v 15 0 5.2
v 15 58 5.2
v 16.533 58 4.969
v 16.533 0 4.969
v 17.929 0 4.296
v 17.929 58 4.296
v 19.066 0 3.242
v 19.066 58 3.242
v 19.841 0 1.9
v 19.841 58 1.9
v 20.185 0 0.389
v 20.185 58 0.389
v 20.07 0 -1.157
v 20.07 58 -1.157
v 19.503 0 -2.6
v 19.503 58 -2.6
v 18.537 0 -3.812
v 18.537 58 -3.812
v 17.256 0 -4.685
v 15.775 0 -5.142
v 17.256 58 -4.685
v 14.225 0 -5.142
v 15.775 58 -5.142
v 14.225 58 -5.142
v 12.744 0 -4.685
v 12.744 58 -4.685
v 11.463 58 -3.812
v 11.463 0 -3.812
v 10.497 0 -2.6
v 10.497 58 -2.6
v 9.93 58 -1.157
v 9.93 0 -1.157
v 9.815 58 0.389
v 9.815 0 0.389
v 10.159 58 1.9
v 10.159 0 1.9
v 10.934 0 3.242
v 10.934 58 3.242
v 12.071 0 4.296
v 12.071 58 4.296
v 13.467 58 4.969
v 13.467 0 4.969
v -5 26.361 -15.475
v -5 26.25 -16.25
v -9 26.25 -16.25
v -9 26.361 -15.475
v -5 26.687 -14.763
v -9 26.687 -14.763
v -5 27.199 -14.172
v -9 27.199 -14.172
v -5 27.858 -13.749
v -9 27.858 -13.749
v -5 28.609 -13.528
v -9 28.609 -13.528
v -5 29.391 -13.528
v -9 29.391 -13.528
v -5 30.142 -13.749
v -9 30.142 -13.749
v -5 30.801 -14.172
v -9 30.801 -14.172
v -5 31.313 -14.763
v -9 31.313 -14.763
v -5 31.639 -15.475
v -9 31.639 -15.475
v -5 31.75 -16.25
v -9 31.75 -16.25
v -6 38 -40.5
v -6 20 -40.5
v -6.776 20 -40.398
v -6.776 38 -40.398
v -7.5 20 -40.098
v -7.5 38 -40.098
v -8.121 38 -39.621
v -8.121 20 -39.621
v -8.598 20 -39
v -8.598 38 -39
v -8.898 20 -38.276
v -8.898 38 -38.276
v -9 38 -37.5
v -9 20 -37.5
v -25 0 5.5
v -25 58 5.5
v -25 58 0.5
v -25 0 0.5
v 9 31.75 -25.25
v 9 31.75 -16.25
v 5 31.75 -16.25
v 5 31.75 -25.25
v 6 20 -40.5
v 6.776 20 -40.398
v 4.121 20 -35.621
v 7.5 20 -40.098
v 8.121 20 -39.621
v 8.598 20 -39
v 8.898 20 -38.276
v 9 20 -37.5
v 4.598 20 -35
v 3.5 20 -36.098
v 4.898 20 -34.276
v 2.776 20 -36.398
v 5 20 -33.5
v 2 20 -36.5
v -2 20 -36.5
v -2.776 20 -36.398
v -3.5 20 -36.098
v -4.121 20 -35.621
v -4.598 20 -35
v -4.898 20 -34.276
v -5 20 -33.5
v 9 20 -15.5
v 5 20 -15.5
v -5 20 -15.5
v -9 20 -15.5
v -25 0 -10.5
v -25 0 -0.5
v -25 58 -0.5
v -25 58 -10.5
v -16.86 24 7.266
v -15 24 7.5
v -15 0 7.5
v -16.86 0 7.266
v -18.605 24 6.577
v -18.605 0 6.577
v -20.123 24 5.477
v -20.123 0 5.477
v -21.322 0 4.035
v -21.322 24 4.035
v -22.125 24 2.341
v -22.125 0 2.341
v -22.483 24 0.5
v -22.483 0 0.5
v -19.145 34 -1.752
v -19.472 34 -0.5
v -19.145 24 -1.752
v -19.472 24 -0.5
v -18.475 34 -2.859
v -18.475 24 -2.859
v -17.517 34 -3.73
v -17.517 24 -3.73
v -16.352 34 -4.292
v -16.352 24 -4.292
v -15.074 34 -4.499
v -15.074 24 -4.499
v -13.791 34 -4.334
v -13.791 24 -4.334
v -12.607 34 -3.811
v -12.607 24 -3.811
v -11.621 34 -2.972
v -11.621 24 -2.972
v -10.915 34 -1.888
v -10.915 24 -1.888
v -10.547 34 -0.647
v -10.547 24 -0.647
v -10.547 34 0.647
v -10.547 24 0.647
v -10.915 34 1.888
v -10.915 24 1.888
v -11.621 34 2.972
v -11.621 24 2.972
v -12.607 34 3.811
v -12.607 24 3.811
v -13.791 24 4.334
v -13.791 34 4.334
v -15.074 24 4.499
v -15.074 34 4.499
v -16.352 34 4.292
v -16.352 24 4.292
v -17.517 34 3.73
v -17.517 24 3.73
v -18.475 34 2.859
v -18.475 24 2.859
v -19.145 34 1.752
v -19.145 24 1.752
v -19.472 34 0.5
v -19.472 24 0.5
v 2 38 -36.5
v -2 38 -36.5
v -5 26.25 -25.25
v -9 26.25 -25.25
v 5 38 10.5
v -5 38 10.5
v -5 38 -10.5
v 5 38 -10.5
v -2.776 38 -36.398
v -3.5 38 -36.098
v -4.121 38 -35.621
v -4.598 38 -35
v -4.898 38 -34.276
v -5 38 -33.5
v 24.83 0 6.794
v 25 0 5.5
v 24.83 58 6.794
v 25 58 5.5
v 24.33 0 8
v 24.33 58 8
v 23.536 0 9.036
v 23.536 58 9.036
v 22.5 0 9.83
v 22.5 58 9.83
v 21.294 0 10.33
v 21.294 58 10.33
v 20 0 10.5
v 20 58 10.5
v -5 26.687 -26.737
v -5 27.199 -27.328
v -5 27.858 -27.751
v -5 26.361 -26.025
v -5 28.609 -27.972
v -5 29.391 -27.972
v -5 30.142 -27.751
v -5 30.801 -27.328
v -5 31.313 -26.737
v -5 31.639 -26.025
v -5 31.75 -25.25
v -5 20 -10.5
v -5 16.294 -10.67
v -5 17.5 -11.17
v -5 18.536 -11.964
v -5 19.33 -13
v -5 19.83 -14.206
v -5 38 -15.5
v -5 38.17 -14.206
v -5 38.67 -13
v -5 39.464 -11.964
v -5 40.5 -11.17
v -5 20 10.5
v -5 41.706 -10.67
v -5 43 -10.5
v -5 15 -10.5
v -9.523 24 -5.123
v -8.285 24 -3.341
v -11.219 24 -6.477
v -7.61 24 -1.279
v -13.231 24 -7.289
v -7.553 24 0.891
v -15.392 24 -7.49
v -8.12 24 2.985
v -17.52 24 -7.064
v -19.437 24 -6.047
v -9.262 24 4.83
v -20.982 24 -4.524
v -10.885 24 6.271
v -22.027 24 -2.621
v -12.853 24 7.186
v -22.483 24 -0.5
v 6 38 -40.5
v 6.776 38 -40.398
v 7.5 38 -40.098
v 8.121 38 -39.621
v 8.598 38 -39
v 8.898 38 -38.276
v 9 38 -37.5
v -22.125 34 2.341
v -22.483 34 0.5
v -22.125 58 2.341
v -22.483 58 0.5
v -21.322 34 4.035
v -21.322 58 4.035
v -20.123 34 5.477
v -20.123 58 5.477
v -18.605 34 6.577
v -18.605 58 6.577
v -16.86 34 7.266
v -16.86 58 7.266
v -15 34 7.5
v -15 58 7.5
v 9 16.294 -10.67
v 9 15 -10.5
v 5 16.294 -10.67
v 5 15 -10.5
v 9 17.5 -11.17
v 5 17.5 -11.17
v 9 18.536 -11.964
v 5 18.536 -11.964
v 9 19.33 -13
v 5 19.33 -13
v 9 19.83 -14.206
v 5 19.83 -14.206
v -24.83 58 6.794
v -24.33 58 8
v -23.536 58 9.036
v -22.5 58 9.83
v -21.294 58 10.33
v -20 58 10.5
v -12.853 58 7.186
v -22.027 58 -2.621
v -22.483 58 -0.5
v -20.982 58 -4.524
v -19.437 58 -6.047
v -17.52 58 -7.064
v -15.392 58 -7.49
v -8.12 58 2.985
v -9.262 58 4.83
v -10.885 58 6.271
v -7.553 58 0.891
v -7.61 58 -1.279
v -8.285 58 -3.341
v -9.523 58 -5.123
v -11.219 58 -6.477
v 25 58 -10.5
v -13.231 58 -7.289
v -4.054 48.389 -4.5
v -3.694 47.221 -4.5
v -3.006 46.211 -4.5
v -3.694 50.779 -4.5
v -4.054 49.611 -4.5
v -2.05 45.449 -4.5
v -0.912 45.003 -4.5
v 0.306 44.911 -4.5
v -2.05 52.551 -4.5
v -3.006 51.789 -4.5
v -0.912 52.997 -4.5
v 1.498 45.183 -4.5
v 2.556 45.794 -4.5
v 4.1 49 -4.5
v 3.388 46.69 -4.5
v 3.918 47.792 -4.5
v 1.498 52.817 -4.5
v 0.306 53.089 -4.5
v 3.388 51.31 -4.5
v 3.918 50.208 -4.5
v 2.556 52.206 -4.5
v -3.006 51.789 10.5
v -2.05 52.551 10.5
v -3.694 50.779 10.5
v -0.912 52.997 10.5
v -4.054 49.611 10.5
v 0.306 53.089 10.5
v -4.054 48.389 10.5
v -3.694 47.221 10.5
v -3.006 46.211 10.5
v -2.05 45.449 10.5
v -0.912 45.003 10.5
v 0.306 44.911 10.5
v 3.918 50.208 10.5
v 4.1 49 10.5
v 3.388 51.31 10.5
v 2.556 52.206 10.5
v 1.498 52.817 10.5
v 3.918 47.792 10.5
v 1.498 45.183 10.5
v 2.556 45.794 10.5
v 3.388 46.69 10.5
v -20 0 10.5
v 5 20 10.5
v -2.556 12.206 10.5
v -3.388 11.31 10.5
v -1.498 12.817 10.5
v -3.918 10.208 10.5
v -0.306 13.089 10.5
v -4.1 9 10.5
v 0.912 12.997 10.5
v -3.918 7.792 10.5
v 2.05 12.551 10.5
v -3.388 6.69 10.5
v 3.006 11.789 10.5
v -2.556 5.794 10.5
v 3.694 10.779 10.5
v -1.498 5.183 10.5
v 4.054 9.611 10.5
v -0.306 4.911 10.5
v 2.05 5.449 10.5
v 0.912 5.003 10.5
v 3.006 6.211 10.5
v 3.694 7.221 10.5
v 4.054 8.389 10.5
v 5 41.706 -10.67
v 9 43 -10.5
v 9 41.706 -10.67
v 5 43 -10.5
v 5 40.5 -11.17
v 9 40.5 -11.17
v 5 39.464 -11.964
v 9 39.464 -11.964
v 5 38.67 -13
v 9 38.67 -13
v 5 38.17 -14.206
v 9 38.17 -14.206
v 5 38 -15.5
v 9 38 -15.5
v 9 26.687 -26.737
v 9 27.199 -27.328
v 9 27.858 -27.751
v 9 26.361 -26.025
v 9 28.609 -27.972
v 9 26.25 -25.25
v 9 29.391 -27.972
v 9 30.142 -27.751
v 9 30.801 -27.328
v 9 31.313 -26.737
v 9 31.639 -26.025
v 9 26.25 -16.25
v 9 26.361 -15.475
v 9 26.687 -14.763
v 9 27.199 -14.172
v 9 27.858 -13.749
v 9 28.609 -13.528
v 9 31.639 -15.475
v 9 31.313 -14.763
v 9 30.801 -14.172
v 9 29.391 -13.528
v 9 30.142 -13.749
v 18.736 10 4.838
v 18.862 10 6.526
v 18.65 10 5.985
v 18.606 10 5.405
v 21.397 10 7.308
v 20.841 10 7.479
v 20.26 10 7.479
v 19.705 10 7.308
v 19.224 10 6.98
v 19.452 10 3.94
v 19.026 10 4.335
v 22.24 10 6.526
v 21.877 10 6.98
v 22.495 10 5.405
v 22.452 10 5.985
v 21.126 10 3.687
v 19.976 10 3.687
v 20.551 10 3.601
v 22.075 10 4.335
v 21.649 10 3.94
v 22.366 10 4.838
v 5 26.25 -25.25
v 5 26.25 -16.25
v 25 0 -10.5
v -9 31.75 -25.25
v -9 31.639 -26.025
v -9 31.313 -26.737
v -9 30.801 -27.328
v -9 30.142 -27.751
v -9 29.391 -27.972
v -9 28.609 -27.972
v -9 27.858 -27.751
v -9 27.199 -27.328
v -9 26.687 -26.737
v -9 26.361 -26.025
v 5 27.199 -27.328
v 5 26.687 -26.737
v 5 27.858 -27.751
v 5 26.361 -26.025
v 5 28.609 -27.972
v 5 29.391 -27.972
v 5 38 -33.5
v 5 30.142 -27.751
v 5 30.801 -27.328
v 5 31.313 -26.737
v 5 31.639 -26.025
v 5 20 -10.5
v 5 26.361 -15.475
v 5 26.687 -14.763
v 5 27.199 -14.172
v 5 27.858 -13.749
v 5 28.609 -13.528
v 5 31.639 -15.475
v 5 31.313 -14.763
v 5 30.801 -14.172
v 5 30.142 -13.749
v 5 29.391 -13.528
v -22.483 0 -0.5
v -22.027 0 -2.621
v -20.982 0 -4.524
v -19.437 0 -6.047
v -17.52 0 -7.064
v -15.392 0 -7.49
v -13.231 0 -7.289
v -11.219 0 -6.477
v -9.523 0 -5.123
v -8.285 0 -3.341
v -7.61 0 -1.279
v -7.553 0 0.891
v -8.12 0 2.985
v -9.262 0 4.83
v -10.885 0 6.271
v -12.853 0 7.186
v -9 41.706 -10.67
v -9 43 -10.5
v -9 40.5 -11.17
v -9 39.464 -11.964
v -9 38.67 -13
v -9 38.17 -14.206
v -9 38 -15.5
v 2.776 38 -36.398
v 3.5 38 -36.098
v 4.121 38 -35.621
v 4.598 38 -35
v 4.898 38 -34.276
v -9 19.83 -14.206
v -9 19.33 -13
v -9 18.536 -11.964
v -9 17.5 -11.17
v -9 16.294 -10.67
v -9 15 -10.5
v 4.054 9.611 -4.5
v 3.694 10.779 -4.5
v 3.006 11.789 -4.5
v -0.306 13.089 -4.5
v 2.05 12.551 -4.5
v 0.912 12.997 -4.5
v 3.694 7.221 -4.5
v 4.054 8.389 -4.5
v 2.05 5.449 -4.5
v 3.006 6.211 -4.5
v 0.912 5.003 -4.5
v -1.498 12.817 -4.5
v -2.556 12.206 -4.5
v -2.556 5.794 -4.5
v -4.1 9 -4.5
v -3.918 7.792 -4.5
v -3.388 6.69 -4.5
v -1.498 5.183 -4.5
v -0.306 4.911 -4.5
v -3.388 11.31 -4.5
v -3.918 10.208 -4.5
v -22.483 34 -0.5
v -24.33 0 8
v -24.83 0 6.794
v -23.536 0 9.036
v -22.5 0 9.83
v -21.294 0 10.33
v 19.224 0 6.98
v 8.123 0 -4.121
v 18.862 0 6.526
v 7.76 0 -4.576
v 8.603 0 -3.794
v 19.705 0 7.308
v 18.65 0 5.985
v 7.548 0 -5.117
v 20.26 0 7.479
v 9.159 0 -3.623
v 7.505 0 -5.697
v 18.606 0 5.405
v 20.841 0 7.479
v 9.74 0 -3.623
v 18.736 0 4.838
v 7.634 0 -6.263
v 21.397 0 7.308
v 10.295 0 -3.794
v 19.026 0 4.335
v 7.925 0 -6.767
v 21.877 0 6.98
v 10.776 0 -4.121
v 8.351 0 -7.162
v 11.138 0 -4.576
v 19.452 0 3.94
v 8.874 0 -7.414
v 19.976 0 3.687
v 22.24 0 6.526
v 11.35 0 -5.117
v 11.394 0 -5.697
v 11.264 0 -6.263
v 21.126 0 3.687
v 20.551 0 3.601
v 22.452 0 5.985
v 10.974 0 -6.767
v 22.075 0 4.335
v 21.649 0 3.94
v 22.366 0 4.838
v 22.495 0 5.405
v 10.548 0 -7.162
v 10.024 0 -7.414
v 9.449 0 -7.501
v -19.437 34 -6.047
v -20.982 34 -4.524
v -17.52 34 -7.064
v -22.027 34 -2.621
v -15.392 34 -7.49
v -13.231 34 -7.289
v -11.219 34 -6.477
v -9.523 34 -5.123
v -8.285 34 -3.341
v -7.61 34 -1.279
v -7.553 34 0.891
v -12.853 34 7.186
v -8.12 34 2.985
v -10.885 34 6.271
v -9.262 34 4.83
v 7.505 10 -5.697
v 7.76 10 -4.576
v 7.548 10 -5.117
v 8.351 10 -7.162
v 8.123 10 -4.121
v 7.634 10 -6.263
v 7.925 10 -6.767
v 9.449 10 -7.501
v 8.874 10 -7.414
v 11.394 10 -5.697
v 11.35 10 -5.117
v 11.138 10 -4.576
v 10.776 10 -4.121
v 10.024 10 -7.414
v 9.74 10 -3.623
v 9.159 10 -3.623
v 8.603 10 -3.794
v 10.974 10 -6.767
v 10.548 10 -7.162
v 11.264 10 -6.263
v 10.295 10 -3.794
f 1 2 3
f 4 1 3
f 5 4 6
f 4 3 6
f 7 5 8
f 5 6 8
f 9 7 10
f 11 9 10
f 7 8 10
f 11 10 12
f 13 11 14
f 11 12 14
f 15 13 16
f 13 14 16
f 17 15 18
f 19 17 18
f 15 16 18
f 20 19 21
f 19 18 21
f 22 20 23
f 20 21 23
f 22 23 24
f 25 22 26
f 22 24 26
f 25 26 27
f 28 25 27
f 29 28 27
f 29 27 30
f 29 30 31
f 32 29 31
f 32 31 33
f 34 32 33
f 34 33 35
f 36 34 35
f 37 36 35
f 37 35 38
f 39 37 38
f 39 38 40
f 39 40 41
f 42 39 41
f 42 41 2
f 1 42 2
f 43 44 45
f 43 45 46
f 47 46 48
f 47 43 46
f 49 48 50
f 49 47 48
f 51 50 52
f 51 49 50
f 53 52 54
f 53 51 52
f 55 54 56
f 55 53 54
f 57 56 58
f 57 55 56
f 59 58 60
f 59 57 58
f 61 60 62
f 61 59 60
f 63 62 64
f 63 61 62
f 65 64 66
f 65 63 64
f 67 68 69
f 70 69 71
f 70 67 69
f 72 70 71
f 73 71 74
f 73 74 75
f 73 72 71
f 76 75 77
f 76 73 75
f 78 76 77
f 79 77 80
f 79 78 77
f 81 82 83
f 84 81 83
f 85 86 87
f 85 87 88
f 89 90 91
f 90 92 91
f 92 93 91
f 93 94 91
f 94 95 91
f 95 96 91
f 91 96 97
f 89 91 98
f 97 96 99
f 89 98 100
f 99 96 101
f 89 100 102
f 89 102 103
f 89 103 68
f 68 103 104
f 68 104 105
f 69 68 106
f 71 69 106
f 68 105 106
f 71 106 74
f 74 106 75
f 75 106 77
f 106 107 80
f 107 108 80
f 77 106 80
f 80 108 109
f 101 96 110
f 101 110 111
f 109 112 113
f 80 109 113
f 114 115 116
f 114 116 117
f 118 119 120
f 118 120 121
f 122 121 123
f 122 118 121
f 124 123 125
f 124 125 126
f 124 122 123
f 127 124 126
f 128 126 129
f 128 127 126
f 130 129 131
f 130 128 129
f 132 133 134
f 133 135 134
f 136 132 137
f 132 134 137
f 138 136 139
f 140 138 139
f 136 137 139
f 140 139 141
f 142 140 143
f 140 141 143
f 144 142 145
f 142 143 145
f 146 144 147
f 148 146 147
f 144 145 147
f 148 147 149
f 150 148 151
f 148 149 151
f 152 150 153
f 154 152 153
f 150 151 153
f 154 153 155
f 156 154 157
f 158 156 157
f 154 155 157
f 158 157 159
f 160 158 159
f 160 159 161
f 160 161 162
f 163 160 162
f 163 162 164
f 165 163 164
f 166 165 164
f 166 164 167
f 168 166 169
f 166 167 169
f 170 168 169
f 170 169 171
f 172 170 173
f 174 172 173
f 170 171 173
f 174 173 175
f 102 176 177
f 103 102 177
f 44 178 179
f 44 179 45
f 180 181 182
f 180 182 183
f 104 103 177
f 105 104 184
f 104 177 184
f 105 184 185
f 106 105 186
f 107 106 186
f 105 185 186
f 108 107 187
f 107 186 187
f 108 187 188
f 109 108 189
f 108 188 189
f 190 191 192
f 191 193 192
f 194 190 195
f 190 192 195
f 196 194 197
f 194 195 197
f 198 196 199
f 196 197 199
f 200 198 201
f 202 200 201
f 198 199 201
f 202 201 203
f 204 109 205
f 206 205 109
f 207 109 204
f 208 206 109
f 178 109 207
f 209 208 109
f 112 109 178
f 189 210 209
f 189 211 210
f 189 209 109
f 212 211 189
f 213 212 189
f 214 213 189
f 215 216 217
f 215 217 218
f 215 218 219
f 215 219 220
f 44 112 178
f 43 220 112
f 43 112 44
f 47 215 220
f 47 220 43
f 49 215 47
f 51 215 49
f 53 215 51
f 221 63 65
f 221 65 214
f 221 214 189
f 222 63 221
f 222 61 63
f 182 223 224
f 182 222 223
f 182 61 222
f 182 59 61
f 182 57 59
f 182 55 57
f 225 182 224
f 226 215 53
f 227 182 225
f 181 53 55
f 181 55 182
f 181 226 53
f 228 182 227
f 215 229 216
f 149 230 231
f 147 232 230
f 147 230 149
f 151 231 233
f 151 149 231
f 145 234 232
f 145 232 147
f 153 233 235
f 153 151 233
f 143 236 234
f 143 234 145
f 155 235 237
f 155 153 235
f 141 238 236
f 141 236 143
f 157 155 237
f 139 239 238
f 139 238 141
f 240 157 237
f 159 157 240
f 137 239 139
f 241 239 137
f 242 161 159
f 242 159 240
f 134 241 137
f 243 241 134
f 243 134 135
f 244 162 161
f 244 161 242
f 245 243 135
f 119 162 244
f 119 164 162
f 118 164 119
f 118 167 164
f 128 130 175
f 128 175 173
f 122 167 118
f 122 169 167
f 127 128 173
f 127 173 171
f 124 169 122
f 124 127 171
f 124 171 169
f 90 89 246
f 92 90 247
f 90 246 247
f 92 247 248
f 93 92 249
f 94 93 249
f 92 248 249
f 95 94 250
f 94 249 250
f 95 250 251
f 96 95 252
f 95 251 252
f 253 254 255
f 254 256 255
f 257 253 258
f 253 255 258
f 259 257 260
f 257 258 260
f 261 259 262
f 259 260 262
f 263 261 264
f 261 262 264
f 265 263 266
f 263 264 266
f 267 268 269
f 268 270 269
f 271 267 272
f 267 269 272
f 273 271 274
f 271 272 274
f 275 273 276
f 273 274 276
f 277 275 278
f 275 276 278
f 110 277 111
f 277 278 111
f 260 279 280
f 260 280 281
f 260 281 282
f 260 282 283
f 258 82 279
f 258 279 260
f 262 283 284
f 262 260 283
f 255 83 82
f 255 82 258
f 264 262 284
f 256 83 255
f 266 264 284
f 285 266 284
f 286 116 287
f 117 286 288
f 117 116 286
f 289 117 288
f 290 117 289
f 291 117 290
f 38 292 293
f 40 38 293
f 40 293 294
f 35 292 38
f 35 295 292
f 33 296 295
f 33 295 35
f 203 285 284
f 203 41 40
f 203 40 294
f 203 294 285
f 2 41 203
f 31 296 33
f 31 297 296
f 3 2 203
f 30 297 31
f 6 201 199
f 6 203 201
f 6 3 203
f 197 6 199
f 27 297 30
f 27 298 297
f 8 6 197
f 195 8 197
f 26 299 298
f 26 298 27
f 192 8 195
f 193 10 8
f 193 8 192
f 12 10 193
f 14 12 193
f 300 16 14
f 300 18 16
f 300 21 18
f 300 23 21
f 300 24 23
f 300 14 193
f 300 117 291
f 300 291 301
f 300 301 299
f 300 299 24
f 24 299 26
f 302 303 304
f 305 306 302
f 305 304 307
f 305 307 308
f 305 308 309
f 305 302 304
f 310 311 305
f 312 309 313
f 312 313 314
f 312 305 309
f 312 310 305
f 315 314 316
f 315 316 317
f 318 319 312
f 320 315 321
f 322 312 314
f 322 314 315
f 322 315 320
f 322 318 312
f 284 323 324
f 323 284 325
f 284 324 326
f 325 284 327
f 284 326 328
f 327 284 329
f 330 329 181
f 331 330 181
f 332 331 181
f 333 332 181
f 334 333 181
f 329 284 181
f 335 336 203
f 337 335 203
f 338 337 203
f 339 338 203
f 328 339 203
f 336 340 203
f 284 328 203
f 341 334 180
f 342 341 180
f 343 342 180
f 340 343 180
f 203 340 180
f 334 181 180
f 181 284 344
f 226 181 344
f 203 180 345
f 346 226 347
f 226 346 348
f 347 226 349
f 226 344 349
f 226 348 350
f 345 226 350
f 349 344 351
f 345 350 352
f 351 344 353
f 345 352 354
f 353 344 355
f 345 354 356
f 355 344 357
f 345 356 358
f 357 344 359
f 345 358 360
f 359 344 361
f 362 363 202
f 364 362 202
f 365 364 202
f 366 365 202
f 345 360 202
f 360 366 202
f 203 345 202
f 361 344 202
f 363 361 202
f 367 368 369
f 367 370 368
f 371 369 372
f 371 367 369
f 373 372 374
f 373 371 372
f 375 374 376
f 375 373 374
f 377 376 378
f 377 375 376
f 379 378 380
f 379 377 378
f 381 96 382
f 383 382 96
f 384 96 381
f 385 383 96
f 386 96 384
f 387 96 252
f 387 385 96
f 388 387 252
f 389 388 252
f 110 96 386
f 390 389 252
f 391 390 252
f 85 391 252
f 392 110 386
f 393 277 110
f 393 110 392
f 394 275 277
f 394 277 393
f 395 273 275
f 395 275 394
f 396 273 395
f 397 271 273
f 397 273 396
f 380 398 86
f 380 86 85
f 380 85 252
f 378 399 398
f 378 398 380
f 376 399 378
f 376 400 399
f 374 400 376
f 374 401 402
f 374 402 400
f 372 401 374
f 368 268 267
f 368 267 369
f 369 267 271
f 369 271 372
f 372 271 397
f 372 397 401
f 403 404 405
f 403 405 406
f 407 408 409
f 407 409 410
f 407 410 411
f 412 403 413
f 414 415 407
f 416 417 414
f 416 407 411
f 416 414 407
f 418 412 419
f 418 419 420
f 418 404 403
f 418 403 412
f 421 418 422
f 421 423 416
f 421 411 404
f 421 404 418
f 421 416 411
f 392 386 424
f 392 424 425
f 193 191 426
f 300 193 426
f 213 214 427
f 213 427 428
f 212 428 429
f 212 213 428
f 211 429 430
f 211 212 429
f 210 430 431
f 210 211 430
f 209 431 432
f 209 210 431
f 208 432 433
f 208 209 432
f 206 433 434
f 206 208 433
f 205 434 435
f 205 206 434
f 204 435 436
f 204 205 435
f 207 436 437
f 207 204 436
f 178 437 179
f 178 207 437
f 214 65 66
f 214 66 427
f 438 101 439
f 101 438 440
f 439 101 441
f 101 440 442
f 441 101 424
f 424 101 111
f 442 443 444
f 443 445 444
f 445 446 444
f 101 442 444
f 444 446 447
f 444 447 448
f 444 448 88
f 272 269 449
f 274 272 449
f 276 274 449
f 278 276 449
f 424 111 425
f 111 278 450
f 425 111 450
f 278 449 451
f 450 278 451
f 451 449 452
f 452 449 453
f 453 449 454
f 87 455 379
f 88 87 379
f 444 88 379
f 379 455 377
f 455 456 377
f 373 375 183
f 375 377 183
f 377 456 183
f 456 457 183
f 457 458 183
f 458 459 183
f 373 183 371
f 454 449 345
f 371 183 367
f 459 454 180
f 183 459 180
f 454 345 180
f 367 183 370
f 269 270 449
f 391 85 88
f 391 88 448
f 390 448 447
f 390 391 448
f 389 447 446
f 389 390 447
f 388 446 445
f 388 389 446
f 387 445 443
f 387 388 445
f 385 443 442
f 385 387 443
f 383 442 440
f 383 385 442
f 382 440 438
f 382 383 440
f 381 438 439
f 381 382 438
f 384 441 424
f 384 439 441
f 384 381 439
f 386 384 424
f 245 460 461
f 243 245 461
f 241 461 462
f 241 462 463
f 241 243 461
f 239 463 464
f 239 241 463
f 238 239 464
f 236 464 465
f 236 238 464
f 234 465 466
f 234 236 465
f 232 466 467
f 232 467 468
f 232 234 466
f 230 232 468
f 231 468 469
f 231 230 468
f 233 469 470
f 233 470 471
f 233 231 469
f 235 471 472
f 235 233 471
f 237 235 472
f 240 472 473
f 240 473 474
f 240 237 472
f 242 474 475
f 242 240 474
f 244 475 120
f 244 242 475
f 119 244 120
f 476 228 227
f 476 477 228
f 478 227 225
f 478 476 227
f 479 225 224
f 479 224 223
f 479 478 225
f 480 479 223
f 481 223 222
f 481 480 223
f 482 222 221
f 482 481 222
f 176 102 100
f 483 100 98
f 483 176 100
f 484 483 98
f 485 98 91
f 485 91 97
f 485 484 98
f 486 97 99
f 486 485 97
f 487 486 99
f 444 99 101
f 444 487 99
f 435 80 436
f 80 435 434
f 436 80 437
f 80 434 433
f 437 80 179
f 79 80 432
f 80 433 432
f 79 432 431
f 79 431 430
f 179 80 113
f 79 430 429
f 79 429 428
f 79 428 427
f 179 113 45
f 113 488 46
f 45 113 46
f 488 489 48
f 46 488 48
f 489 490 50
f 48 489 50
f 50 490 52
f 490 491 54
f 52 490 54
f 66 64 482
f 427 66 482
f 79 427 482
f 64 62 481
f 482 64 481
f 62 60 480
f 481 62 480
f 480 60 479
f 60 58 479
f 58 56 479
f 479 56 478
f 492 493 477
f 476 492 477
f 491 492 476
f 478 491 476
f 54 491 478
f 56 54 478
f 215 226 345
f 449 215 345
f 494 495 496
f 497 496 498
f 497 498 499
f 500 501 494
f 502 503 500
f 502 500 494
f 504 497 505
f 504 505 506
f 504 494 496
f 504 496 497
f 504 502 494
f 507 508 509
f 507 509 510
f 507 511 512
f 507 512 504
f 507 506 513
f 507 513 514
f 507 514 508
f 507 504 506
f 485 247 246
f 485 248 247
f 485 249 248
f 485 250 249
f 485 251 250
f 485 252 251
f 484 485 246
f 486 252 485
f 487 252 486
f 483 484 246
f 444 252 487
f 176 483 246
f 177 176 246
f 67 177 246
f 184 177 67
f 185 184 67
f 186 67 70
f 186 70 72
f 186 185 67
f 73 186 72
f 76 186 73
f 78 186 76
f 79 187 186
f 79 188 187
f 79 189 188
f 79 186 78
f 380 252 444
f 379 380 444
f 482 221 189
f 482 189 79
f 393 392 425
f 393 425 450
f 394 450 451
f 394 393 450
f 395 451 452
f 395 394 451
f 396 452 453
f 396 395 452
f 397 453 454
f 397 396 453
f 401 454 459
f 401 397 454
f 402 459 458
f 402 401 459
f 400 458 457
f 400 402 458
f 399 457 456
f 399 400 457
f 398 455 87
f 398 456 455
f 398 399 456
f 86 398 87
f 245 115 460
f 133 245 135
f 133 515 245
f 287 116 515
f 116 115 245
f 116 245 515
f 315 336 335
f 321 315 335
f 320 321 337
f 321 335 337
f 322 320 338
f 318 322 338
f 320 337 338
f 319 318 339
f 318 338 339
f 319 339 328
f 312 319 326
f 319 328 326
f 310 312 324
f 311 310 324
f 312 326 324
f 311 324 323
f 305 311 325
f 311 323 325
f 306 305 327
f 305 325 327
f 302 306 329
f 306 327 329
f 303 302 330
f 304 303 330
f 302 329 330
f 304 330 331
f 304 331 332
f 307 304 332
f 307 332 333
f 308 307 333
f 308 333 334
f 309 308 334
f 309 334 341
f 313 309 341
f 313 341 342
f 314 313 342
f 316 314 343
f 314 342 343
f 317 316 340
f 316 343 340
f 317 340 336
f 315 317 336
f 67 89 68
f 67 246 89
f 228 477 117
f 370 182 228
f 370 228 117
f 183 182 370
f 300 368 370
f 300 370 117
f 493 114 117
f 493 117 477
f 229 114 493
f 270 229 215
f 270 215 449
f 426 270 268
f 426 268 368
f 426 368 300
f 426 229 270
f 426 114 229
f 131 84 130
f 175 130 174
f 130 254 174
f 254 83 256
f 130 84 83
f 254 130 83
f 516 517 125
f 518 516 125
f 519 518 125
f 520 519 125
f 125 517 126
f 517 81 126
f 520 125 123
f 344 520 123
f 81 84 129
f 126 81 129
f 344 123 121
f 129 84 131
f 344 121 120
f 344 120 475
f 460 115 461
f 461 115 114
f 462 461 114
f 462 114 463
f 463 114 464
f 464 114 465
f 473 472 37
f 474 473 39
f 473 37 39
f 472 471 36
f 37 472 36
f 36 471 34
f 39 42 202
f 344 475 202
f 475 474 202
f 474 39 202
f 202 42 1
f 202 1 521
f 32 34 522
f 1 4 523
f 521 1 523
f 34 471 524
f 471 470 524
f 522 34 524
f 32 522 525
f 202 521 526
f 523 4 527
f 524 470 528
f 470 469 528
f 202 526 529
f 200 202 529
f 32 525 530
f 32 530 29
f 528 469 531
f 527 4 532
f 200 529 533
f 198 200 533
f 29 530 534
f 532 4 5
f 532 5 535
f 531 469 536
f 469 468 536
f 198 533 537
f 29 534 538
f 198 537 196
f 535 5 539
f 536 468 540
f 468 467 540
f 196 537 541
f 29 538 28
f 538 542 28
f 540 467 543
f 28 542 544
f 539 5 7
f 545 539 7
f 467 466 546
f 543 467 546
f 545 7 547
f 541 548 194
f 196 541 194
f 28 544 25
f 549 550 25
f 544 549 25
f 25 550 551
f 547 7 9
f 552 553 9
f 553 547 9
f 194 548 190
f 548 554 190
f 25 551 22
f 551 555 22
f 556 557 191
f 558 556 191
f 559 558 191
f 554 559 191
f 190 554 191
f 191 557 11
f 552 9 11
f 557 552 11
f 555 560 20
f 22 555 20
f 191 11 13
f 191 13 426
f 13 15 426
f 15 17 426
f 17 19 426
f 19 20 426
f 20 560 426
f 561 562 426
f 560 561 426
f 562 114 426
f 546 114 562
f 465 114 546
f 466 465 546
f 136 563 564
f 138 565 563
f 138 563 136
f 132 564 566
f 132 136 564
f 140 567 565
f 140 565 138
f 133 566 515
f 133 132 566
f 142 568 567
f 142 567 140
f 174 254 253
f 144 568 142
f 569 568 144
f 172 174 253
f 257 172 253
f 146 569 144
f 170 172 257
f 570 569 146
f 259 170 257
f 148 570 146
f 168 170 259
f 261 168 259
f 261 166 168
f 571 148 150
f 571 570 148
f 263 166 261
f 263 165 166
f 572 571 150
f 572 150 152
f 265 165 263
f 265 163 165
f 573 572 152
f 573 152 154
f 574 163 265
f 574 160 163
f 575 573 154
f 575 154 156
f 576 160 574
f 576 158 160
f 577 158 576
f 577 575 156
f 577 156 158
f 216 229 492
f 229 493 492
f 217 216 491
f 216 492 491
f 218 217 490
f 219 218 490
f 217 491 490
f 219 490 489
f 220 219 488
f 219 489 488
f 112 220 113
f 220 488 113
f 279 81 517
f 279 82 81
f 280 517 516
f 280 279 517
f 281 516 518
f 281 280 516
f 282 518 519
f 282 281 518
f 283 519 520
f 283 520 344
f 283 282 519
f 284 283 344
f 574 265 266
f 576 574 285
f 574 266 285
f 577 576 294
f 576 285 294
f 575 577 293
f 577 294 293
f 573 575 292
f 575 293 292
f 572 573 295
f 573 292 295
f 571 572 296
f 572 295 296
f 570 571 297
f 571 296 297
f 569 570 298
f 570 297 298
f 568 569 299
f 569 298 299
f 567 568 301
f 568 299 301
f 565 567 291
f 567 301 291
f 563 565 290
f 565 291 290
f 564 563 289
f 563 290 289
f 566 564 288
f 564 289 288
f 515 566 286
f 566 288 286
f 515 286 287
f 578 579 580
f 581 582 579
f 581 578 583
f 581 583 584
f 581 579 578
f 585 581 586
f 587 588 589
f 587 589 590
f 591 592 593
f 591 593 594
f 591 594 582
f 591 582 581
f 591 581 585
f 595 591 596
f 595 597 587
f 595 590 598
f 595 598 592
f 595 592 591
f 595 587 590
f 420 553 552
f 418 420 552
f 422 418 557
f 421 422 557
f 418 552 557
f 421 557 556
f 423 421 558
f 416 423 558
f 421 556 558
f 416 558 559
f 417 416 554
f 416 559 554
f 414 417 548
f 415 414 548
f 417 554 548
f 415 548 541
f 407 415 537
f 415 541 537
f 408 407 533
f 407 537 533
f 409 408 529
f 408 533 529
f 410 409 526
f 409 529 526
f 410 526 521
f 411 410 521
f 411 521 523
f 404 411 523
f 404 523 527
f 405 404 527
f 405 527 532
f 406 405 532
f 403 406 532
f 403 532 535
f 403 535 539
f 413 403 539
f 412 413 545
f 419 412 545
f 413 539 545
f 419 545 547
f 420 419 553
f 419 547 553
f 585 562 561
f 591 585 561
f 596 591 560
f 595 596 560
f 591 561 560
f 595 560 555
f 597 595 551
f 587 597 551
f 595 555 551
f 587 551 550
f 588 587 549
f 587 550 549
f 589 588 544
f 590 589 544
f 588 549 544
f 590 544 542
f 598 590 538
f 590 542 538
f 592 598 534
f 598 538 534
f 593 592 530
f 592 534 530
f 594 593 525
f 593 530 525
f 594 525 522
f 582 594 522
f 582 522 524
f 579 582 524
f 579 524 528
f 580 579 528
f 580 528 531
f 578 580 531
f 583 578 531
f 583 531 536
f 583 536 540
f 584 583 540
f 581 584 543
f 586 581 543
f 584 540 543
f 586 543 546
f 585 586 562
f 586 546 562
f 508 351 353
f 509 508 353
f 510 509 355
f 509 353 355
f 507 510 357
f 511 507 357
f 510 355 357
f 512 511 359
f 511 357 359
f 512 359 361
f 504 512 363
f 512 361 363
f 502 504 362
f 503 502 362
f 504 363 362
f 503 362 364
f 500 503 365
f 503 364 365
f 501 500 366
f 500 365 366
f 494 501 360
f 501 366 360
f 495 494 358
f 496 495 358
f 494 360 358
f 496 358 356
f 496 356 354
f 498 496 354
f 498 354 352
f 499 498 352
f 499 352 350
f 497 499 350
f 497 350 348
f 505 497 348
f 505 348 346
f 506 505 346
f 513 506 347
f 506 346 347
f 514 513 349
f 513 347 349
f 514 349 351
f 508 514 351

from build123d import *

# Parameters (mm, degrees)
SKETCH1_W           = 50
SKETCH1_H           = 21
BOSS_EXTRUDE1_DEPTH = 58
SKETCH3_R           = 7.5
CUT_EXTRUDE1_DEPTH  = 24
CUT_EXTRUDE2_REACH  = 66.025
SKETCH4_R           = 5.2
CUT_EXTRUDE3_START  = -24
SKETCH5_R           = 7.5
CUT_EXTRUDE3_DEPTH  = 24
CUT_EXTRUDE4_REACH  = 66.025
SKETCH6_R           = 4.5
CUT_EXTRUDE5_REACH  = 68.558
SKETCH8_W           = 10
SKETCH8_H           = 18
SKETCH7_R           = 4.1
CUT_EXTRUDE6_DEPTH  = 15
SKETCH11_W          = 4
SKETCH11_H          = 18
BOSS_EXTRUDE2_DEPTH = 26
SKETCH12_W          = 18
SKETCH12_H          = 18
BOSS_EXTRUDE3_DEPTH = 4
CUT_EXTRUDE7_DEPTH  = 79.487260113
FILLET1_R           = 5
FILLET2_R           = 5
FILLET3_R           = 3
SKETCH14_R          = 1.95
CUT_EXTRUDE8_DEPTH  = 10
SKETCH15_W          = 5.527864045
SKETCH15_H          = 1
CUT_EXTRUDE9_DEPTH  = 76.028327984


with BuildPart() as part:
    # Sketch1 → Boss-Extrude1 (new body)
    with BuildSketch(Plane(origin=(0, 0, 0), x_dir=(1, 0, 0), z_dir=(0, 1, 0))):
        Rectangle(SKETCH1_W, SKETCH1_H)
    extrude(amount=BOSS_EXTRUDE1_DEPTH)

    # Sketch3 → Cut-Extrude1 (cut)
    with BuildSketch(Plane(origin=(0, 58, 0), x_dir=(1, 0, 0), z_dir=(0, 1, 0))):
        with Locations(Location((-15, 0, 0), (0, 0, 270))):
            Circle(SKETCH3_R)
    extrude(amount=-CUT_EXTRUDE1_DEPTH, mode=Mode.SUBTRACT)

    # Sketch4 → Cut-Extrude2 (cut, up to next)
    with BuildSketch(Plane(origin=(0, 58, 0), x_dir=(1, 0, 0), z_dir=(0, 1, 0)), mode=Mode.PRIVATE) as cut_extrude2_sk1:
        with Locations(Location((15, 0, 0), (0, 0, 270))):
            Circle(SKETCH4_R)
    cut_extrude2_tool1 = extrude(cut_extrude2_sk1.sketch, amount=-CUT_EXTRUDE2_REACH, mode=Mode.PRIVATE) & part.part
    add(cut_extrude2_tool1.solids().sort_by_distance((15, 58, 0))[0], mode=Mode.SUBTRACT)

    # Sketch5 → Cut-Extrude3 (cut)
    with BuildSketch(Plane.XZ.offset(CUT_EXTRUDE3_START)):
        with Locations(Location((-15, 0, 0), (0, 0, 90))):
            Circle(SKETCH5_R)
    extrude(amount=CUT_EXTRUDE3_DEPTH, mode=Mode.SUBTRACT)

    # Sketch6 → Cut-Extrude4 (cut, up to next)
    with BuildSketch(Plane.XZ, mode=Mode.PRIVATE) as cut_extrude4_sk1:
        with Locations(Location((-15, 0, 0), (0, 0, 270))):
            Circle(SKETCH6_R)
    cut_extrude4_tool1 = extrude(cut_extrude4_sk1.sketch, amount=-CUT_EXTRUDE4_REACH, mode=Mode.PRIVATE) & part.part
    add(cut_extrude4_tool1.solids().sort_by_distance((-15, 0, 0))[0], mode=Mode.SUBTRACT)

    # Sketch8 → Cut-Extrude5 (cut, up to next)
    with BuildSketch(Plane.XY.offset(10.5), mode=Mode.PRIVATE) as cut_extrude5_sk1:
        with Locations((0, 29)):
            Rectangle(SKETCH8_W, SKETCH8_H)
    cut_extrude5_tool1 = extrude(cut_extrude5_sk1.sketch, amount=-CUT_EXTRUDE5_REACH, mode=Mode.PRIVATE) & part.part
    add(cut_extrude5_tool1.solids().sort_by_distance((0, 29, 10.5))[0], mode=Mode.SUBTRACT)

    # Sketch7 → Cut-Extrude6 (cut)
    with BuildSketch(Plane.XY.offset(10.5)):
        with Locations((0, 49)):
            Circle(SKETCH7_R)
        with Locations(Location((0, 9, 0), (0, 0, 180))):
            Circle(SKETCH7_R)
    extrude(amount=-CUT_EXTRUDE6_DEPTH, mode=Mode.SUBTRACT)

    # Sketch11 → Boss-Extrude2 (add)
    with BuildSketch(Plane(origin=(0, 0, -10.5), x_dir=(-1, 0, 0), z_dir=(0, 0, -1))):
        with Locations((7, 29)):
            Rectangle(SKETCH11_W, SKETCH11_H)
        with Locations((-7, 29)):
            Rectangle(SKETCH11_W, SKETCH11_H)
    extrude(amount=BOSS_EXTRUDE2_DEPTH)

    # Sketch12 → Boss-Extrude3 (add)
    with BuildSketch(Plane(origin=(0, 0, -36.5), x_dir=(-1, 0, 0), z_dir=(0, 0, -1))):
        with Locations((0, 29)):
            Rectangle(SKETCH12_W, SKETCH12_H)
    extrude(amount=BOSS_EXTRUDE3_DEPTH)

    # Sketch13 → Cut-Extrude7 (cut, through all)
    with BuildSketch(Plane(origin=(9, 0, 0), x_dir=(0, 0, -1), z_dir=(1, 0, 0))):
        with BuildLine():
            Line((16.25, 31.75), (25.25, 31.75))
            ThreePointArc((25.25, 31.75), (28, 29), (25.25, 26.25))
            Line((25.25, 26.25), (16.25, 26.25))
            ThreePointArc((16.25, 26.25), (13.5, 29), (16.25, 31.75))
        make_face()
    extrude(amount=-CUT_EXTRUDE7_DEPTH, mode=Mode.SUBTRACT)

    # Fillet1
    fillet1_edges = [part.edges().sort_by_distance(p)[0] for p in [
        (25, 29, 10.5),
        (-25, 29, 10.5),
    ]]
    fillet(fillet1_edges, radius=FILLET1_R)

    # Fillet2
    fillet2_edges = [part.edges().sort_by_distance(p)[0] for p in [
        (-7, 38, -10.5),
        (-7, 20, -10.5),
        (7, 20, -10.5),
        (7, 38, -10.5),
    ]]
    fillet(fillet2_edges, radius=FILLET2_R)

    # Fillet3
    fillet3_edges = [part.edges().sort_by_distance(p)[0] for p in [
        (-5, 29, -36.5),
        (5, 29, -36.5),
        (-9, 29, -40.5),
        (9, 29, -40.5),
    ]]
    fillet(fillet3_edges, radius=FILLET3_R)

    # Sketch14 → Cut-Extrude8 (cut)
    with BuildSketch(Plane.XZ):
        with Locations(Location((20.550788232, 5.550788232, 0), (0, 0, 270))):
            Circle(SKETCH14_R)
        with Locations(Location((9.449211768, -5.550788232, 0), (0, 0, 270))):
            Circle(SKETCH14_R)
    extrude(amount=-CUT_EXTRUDE8_DEPTH, mode=Mode.SUBTRACT)

    # Sketch15 → Cut-Extrude9 (cut, through all)
    with BuildSketch(Plane(origin=(0, 58, 0), x_dir=(1, 0, 0), z_dir=(0, 1, 0))):
        with Locations((-22.236067977, 0)):
            Rectangle(SKETCH15_W, SKETCH15_H)
    extrude(amount=-CUT_EXTRUDE9_DEPTH, mode=Mode.SUBTRACT)


solid = part.part
